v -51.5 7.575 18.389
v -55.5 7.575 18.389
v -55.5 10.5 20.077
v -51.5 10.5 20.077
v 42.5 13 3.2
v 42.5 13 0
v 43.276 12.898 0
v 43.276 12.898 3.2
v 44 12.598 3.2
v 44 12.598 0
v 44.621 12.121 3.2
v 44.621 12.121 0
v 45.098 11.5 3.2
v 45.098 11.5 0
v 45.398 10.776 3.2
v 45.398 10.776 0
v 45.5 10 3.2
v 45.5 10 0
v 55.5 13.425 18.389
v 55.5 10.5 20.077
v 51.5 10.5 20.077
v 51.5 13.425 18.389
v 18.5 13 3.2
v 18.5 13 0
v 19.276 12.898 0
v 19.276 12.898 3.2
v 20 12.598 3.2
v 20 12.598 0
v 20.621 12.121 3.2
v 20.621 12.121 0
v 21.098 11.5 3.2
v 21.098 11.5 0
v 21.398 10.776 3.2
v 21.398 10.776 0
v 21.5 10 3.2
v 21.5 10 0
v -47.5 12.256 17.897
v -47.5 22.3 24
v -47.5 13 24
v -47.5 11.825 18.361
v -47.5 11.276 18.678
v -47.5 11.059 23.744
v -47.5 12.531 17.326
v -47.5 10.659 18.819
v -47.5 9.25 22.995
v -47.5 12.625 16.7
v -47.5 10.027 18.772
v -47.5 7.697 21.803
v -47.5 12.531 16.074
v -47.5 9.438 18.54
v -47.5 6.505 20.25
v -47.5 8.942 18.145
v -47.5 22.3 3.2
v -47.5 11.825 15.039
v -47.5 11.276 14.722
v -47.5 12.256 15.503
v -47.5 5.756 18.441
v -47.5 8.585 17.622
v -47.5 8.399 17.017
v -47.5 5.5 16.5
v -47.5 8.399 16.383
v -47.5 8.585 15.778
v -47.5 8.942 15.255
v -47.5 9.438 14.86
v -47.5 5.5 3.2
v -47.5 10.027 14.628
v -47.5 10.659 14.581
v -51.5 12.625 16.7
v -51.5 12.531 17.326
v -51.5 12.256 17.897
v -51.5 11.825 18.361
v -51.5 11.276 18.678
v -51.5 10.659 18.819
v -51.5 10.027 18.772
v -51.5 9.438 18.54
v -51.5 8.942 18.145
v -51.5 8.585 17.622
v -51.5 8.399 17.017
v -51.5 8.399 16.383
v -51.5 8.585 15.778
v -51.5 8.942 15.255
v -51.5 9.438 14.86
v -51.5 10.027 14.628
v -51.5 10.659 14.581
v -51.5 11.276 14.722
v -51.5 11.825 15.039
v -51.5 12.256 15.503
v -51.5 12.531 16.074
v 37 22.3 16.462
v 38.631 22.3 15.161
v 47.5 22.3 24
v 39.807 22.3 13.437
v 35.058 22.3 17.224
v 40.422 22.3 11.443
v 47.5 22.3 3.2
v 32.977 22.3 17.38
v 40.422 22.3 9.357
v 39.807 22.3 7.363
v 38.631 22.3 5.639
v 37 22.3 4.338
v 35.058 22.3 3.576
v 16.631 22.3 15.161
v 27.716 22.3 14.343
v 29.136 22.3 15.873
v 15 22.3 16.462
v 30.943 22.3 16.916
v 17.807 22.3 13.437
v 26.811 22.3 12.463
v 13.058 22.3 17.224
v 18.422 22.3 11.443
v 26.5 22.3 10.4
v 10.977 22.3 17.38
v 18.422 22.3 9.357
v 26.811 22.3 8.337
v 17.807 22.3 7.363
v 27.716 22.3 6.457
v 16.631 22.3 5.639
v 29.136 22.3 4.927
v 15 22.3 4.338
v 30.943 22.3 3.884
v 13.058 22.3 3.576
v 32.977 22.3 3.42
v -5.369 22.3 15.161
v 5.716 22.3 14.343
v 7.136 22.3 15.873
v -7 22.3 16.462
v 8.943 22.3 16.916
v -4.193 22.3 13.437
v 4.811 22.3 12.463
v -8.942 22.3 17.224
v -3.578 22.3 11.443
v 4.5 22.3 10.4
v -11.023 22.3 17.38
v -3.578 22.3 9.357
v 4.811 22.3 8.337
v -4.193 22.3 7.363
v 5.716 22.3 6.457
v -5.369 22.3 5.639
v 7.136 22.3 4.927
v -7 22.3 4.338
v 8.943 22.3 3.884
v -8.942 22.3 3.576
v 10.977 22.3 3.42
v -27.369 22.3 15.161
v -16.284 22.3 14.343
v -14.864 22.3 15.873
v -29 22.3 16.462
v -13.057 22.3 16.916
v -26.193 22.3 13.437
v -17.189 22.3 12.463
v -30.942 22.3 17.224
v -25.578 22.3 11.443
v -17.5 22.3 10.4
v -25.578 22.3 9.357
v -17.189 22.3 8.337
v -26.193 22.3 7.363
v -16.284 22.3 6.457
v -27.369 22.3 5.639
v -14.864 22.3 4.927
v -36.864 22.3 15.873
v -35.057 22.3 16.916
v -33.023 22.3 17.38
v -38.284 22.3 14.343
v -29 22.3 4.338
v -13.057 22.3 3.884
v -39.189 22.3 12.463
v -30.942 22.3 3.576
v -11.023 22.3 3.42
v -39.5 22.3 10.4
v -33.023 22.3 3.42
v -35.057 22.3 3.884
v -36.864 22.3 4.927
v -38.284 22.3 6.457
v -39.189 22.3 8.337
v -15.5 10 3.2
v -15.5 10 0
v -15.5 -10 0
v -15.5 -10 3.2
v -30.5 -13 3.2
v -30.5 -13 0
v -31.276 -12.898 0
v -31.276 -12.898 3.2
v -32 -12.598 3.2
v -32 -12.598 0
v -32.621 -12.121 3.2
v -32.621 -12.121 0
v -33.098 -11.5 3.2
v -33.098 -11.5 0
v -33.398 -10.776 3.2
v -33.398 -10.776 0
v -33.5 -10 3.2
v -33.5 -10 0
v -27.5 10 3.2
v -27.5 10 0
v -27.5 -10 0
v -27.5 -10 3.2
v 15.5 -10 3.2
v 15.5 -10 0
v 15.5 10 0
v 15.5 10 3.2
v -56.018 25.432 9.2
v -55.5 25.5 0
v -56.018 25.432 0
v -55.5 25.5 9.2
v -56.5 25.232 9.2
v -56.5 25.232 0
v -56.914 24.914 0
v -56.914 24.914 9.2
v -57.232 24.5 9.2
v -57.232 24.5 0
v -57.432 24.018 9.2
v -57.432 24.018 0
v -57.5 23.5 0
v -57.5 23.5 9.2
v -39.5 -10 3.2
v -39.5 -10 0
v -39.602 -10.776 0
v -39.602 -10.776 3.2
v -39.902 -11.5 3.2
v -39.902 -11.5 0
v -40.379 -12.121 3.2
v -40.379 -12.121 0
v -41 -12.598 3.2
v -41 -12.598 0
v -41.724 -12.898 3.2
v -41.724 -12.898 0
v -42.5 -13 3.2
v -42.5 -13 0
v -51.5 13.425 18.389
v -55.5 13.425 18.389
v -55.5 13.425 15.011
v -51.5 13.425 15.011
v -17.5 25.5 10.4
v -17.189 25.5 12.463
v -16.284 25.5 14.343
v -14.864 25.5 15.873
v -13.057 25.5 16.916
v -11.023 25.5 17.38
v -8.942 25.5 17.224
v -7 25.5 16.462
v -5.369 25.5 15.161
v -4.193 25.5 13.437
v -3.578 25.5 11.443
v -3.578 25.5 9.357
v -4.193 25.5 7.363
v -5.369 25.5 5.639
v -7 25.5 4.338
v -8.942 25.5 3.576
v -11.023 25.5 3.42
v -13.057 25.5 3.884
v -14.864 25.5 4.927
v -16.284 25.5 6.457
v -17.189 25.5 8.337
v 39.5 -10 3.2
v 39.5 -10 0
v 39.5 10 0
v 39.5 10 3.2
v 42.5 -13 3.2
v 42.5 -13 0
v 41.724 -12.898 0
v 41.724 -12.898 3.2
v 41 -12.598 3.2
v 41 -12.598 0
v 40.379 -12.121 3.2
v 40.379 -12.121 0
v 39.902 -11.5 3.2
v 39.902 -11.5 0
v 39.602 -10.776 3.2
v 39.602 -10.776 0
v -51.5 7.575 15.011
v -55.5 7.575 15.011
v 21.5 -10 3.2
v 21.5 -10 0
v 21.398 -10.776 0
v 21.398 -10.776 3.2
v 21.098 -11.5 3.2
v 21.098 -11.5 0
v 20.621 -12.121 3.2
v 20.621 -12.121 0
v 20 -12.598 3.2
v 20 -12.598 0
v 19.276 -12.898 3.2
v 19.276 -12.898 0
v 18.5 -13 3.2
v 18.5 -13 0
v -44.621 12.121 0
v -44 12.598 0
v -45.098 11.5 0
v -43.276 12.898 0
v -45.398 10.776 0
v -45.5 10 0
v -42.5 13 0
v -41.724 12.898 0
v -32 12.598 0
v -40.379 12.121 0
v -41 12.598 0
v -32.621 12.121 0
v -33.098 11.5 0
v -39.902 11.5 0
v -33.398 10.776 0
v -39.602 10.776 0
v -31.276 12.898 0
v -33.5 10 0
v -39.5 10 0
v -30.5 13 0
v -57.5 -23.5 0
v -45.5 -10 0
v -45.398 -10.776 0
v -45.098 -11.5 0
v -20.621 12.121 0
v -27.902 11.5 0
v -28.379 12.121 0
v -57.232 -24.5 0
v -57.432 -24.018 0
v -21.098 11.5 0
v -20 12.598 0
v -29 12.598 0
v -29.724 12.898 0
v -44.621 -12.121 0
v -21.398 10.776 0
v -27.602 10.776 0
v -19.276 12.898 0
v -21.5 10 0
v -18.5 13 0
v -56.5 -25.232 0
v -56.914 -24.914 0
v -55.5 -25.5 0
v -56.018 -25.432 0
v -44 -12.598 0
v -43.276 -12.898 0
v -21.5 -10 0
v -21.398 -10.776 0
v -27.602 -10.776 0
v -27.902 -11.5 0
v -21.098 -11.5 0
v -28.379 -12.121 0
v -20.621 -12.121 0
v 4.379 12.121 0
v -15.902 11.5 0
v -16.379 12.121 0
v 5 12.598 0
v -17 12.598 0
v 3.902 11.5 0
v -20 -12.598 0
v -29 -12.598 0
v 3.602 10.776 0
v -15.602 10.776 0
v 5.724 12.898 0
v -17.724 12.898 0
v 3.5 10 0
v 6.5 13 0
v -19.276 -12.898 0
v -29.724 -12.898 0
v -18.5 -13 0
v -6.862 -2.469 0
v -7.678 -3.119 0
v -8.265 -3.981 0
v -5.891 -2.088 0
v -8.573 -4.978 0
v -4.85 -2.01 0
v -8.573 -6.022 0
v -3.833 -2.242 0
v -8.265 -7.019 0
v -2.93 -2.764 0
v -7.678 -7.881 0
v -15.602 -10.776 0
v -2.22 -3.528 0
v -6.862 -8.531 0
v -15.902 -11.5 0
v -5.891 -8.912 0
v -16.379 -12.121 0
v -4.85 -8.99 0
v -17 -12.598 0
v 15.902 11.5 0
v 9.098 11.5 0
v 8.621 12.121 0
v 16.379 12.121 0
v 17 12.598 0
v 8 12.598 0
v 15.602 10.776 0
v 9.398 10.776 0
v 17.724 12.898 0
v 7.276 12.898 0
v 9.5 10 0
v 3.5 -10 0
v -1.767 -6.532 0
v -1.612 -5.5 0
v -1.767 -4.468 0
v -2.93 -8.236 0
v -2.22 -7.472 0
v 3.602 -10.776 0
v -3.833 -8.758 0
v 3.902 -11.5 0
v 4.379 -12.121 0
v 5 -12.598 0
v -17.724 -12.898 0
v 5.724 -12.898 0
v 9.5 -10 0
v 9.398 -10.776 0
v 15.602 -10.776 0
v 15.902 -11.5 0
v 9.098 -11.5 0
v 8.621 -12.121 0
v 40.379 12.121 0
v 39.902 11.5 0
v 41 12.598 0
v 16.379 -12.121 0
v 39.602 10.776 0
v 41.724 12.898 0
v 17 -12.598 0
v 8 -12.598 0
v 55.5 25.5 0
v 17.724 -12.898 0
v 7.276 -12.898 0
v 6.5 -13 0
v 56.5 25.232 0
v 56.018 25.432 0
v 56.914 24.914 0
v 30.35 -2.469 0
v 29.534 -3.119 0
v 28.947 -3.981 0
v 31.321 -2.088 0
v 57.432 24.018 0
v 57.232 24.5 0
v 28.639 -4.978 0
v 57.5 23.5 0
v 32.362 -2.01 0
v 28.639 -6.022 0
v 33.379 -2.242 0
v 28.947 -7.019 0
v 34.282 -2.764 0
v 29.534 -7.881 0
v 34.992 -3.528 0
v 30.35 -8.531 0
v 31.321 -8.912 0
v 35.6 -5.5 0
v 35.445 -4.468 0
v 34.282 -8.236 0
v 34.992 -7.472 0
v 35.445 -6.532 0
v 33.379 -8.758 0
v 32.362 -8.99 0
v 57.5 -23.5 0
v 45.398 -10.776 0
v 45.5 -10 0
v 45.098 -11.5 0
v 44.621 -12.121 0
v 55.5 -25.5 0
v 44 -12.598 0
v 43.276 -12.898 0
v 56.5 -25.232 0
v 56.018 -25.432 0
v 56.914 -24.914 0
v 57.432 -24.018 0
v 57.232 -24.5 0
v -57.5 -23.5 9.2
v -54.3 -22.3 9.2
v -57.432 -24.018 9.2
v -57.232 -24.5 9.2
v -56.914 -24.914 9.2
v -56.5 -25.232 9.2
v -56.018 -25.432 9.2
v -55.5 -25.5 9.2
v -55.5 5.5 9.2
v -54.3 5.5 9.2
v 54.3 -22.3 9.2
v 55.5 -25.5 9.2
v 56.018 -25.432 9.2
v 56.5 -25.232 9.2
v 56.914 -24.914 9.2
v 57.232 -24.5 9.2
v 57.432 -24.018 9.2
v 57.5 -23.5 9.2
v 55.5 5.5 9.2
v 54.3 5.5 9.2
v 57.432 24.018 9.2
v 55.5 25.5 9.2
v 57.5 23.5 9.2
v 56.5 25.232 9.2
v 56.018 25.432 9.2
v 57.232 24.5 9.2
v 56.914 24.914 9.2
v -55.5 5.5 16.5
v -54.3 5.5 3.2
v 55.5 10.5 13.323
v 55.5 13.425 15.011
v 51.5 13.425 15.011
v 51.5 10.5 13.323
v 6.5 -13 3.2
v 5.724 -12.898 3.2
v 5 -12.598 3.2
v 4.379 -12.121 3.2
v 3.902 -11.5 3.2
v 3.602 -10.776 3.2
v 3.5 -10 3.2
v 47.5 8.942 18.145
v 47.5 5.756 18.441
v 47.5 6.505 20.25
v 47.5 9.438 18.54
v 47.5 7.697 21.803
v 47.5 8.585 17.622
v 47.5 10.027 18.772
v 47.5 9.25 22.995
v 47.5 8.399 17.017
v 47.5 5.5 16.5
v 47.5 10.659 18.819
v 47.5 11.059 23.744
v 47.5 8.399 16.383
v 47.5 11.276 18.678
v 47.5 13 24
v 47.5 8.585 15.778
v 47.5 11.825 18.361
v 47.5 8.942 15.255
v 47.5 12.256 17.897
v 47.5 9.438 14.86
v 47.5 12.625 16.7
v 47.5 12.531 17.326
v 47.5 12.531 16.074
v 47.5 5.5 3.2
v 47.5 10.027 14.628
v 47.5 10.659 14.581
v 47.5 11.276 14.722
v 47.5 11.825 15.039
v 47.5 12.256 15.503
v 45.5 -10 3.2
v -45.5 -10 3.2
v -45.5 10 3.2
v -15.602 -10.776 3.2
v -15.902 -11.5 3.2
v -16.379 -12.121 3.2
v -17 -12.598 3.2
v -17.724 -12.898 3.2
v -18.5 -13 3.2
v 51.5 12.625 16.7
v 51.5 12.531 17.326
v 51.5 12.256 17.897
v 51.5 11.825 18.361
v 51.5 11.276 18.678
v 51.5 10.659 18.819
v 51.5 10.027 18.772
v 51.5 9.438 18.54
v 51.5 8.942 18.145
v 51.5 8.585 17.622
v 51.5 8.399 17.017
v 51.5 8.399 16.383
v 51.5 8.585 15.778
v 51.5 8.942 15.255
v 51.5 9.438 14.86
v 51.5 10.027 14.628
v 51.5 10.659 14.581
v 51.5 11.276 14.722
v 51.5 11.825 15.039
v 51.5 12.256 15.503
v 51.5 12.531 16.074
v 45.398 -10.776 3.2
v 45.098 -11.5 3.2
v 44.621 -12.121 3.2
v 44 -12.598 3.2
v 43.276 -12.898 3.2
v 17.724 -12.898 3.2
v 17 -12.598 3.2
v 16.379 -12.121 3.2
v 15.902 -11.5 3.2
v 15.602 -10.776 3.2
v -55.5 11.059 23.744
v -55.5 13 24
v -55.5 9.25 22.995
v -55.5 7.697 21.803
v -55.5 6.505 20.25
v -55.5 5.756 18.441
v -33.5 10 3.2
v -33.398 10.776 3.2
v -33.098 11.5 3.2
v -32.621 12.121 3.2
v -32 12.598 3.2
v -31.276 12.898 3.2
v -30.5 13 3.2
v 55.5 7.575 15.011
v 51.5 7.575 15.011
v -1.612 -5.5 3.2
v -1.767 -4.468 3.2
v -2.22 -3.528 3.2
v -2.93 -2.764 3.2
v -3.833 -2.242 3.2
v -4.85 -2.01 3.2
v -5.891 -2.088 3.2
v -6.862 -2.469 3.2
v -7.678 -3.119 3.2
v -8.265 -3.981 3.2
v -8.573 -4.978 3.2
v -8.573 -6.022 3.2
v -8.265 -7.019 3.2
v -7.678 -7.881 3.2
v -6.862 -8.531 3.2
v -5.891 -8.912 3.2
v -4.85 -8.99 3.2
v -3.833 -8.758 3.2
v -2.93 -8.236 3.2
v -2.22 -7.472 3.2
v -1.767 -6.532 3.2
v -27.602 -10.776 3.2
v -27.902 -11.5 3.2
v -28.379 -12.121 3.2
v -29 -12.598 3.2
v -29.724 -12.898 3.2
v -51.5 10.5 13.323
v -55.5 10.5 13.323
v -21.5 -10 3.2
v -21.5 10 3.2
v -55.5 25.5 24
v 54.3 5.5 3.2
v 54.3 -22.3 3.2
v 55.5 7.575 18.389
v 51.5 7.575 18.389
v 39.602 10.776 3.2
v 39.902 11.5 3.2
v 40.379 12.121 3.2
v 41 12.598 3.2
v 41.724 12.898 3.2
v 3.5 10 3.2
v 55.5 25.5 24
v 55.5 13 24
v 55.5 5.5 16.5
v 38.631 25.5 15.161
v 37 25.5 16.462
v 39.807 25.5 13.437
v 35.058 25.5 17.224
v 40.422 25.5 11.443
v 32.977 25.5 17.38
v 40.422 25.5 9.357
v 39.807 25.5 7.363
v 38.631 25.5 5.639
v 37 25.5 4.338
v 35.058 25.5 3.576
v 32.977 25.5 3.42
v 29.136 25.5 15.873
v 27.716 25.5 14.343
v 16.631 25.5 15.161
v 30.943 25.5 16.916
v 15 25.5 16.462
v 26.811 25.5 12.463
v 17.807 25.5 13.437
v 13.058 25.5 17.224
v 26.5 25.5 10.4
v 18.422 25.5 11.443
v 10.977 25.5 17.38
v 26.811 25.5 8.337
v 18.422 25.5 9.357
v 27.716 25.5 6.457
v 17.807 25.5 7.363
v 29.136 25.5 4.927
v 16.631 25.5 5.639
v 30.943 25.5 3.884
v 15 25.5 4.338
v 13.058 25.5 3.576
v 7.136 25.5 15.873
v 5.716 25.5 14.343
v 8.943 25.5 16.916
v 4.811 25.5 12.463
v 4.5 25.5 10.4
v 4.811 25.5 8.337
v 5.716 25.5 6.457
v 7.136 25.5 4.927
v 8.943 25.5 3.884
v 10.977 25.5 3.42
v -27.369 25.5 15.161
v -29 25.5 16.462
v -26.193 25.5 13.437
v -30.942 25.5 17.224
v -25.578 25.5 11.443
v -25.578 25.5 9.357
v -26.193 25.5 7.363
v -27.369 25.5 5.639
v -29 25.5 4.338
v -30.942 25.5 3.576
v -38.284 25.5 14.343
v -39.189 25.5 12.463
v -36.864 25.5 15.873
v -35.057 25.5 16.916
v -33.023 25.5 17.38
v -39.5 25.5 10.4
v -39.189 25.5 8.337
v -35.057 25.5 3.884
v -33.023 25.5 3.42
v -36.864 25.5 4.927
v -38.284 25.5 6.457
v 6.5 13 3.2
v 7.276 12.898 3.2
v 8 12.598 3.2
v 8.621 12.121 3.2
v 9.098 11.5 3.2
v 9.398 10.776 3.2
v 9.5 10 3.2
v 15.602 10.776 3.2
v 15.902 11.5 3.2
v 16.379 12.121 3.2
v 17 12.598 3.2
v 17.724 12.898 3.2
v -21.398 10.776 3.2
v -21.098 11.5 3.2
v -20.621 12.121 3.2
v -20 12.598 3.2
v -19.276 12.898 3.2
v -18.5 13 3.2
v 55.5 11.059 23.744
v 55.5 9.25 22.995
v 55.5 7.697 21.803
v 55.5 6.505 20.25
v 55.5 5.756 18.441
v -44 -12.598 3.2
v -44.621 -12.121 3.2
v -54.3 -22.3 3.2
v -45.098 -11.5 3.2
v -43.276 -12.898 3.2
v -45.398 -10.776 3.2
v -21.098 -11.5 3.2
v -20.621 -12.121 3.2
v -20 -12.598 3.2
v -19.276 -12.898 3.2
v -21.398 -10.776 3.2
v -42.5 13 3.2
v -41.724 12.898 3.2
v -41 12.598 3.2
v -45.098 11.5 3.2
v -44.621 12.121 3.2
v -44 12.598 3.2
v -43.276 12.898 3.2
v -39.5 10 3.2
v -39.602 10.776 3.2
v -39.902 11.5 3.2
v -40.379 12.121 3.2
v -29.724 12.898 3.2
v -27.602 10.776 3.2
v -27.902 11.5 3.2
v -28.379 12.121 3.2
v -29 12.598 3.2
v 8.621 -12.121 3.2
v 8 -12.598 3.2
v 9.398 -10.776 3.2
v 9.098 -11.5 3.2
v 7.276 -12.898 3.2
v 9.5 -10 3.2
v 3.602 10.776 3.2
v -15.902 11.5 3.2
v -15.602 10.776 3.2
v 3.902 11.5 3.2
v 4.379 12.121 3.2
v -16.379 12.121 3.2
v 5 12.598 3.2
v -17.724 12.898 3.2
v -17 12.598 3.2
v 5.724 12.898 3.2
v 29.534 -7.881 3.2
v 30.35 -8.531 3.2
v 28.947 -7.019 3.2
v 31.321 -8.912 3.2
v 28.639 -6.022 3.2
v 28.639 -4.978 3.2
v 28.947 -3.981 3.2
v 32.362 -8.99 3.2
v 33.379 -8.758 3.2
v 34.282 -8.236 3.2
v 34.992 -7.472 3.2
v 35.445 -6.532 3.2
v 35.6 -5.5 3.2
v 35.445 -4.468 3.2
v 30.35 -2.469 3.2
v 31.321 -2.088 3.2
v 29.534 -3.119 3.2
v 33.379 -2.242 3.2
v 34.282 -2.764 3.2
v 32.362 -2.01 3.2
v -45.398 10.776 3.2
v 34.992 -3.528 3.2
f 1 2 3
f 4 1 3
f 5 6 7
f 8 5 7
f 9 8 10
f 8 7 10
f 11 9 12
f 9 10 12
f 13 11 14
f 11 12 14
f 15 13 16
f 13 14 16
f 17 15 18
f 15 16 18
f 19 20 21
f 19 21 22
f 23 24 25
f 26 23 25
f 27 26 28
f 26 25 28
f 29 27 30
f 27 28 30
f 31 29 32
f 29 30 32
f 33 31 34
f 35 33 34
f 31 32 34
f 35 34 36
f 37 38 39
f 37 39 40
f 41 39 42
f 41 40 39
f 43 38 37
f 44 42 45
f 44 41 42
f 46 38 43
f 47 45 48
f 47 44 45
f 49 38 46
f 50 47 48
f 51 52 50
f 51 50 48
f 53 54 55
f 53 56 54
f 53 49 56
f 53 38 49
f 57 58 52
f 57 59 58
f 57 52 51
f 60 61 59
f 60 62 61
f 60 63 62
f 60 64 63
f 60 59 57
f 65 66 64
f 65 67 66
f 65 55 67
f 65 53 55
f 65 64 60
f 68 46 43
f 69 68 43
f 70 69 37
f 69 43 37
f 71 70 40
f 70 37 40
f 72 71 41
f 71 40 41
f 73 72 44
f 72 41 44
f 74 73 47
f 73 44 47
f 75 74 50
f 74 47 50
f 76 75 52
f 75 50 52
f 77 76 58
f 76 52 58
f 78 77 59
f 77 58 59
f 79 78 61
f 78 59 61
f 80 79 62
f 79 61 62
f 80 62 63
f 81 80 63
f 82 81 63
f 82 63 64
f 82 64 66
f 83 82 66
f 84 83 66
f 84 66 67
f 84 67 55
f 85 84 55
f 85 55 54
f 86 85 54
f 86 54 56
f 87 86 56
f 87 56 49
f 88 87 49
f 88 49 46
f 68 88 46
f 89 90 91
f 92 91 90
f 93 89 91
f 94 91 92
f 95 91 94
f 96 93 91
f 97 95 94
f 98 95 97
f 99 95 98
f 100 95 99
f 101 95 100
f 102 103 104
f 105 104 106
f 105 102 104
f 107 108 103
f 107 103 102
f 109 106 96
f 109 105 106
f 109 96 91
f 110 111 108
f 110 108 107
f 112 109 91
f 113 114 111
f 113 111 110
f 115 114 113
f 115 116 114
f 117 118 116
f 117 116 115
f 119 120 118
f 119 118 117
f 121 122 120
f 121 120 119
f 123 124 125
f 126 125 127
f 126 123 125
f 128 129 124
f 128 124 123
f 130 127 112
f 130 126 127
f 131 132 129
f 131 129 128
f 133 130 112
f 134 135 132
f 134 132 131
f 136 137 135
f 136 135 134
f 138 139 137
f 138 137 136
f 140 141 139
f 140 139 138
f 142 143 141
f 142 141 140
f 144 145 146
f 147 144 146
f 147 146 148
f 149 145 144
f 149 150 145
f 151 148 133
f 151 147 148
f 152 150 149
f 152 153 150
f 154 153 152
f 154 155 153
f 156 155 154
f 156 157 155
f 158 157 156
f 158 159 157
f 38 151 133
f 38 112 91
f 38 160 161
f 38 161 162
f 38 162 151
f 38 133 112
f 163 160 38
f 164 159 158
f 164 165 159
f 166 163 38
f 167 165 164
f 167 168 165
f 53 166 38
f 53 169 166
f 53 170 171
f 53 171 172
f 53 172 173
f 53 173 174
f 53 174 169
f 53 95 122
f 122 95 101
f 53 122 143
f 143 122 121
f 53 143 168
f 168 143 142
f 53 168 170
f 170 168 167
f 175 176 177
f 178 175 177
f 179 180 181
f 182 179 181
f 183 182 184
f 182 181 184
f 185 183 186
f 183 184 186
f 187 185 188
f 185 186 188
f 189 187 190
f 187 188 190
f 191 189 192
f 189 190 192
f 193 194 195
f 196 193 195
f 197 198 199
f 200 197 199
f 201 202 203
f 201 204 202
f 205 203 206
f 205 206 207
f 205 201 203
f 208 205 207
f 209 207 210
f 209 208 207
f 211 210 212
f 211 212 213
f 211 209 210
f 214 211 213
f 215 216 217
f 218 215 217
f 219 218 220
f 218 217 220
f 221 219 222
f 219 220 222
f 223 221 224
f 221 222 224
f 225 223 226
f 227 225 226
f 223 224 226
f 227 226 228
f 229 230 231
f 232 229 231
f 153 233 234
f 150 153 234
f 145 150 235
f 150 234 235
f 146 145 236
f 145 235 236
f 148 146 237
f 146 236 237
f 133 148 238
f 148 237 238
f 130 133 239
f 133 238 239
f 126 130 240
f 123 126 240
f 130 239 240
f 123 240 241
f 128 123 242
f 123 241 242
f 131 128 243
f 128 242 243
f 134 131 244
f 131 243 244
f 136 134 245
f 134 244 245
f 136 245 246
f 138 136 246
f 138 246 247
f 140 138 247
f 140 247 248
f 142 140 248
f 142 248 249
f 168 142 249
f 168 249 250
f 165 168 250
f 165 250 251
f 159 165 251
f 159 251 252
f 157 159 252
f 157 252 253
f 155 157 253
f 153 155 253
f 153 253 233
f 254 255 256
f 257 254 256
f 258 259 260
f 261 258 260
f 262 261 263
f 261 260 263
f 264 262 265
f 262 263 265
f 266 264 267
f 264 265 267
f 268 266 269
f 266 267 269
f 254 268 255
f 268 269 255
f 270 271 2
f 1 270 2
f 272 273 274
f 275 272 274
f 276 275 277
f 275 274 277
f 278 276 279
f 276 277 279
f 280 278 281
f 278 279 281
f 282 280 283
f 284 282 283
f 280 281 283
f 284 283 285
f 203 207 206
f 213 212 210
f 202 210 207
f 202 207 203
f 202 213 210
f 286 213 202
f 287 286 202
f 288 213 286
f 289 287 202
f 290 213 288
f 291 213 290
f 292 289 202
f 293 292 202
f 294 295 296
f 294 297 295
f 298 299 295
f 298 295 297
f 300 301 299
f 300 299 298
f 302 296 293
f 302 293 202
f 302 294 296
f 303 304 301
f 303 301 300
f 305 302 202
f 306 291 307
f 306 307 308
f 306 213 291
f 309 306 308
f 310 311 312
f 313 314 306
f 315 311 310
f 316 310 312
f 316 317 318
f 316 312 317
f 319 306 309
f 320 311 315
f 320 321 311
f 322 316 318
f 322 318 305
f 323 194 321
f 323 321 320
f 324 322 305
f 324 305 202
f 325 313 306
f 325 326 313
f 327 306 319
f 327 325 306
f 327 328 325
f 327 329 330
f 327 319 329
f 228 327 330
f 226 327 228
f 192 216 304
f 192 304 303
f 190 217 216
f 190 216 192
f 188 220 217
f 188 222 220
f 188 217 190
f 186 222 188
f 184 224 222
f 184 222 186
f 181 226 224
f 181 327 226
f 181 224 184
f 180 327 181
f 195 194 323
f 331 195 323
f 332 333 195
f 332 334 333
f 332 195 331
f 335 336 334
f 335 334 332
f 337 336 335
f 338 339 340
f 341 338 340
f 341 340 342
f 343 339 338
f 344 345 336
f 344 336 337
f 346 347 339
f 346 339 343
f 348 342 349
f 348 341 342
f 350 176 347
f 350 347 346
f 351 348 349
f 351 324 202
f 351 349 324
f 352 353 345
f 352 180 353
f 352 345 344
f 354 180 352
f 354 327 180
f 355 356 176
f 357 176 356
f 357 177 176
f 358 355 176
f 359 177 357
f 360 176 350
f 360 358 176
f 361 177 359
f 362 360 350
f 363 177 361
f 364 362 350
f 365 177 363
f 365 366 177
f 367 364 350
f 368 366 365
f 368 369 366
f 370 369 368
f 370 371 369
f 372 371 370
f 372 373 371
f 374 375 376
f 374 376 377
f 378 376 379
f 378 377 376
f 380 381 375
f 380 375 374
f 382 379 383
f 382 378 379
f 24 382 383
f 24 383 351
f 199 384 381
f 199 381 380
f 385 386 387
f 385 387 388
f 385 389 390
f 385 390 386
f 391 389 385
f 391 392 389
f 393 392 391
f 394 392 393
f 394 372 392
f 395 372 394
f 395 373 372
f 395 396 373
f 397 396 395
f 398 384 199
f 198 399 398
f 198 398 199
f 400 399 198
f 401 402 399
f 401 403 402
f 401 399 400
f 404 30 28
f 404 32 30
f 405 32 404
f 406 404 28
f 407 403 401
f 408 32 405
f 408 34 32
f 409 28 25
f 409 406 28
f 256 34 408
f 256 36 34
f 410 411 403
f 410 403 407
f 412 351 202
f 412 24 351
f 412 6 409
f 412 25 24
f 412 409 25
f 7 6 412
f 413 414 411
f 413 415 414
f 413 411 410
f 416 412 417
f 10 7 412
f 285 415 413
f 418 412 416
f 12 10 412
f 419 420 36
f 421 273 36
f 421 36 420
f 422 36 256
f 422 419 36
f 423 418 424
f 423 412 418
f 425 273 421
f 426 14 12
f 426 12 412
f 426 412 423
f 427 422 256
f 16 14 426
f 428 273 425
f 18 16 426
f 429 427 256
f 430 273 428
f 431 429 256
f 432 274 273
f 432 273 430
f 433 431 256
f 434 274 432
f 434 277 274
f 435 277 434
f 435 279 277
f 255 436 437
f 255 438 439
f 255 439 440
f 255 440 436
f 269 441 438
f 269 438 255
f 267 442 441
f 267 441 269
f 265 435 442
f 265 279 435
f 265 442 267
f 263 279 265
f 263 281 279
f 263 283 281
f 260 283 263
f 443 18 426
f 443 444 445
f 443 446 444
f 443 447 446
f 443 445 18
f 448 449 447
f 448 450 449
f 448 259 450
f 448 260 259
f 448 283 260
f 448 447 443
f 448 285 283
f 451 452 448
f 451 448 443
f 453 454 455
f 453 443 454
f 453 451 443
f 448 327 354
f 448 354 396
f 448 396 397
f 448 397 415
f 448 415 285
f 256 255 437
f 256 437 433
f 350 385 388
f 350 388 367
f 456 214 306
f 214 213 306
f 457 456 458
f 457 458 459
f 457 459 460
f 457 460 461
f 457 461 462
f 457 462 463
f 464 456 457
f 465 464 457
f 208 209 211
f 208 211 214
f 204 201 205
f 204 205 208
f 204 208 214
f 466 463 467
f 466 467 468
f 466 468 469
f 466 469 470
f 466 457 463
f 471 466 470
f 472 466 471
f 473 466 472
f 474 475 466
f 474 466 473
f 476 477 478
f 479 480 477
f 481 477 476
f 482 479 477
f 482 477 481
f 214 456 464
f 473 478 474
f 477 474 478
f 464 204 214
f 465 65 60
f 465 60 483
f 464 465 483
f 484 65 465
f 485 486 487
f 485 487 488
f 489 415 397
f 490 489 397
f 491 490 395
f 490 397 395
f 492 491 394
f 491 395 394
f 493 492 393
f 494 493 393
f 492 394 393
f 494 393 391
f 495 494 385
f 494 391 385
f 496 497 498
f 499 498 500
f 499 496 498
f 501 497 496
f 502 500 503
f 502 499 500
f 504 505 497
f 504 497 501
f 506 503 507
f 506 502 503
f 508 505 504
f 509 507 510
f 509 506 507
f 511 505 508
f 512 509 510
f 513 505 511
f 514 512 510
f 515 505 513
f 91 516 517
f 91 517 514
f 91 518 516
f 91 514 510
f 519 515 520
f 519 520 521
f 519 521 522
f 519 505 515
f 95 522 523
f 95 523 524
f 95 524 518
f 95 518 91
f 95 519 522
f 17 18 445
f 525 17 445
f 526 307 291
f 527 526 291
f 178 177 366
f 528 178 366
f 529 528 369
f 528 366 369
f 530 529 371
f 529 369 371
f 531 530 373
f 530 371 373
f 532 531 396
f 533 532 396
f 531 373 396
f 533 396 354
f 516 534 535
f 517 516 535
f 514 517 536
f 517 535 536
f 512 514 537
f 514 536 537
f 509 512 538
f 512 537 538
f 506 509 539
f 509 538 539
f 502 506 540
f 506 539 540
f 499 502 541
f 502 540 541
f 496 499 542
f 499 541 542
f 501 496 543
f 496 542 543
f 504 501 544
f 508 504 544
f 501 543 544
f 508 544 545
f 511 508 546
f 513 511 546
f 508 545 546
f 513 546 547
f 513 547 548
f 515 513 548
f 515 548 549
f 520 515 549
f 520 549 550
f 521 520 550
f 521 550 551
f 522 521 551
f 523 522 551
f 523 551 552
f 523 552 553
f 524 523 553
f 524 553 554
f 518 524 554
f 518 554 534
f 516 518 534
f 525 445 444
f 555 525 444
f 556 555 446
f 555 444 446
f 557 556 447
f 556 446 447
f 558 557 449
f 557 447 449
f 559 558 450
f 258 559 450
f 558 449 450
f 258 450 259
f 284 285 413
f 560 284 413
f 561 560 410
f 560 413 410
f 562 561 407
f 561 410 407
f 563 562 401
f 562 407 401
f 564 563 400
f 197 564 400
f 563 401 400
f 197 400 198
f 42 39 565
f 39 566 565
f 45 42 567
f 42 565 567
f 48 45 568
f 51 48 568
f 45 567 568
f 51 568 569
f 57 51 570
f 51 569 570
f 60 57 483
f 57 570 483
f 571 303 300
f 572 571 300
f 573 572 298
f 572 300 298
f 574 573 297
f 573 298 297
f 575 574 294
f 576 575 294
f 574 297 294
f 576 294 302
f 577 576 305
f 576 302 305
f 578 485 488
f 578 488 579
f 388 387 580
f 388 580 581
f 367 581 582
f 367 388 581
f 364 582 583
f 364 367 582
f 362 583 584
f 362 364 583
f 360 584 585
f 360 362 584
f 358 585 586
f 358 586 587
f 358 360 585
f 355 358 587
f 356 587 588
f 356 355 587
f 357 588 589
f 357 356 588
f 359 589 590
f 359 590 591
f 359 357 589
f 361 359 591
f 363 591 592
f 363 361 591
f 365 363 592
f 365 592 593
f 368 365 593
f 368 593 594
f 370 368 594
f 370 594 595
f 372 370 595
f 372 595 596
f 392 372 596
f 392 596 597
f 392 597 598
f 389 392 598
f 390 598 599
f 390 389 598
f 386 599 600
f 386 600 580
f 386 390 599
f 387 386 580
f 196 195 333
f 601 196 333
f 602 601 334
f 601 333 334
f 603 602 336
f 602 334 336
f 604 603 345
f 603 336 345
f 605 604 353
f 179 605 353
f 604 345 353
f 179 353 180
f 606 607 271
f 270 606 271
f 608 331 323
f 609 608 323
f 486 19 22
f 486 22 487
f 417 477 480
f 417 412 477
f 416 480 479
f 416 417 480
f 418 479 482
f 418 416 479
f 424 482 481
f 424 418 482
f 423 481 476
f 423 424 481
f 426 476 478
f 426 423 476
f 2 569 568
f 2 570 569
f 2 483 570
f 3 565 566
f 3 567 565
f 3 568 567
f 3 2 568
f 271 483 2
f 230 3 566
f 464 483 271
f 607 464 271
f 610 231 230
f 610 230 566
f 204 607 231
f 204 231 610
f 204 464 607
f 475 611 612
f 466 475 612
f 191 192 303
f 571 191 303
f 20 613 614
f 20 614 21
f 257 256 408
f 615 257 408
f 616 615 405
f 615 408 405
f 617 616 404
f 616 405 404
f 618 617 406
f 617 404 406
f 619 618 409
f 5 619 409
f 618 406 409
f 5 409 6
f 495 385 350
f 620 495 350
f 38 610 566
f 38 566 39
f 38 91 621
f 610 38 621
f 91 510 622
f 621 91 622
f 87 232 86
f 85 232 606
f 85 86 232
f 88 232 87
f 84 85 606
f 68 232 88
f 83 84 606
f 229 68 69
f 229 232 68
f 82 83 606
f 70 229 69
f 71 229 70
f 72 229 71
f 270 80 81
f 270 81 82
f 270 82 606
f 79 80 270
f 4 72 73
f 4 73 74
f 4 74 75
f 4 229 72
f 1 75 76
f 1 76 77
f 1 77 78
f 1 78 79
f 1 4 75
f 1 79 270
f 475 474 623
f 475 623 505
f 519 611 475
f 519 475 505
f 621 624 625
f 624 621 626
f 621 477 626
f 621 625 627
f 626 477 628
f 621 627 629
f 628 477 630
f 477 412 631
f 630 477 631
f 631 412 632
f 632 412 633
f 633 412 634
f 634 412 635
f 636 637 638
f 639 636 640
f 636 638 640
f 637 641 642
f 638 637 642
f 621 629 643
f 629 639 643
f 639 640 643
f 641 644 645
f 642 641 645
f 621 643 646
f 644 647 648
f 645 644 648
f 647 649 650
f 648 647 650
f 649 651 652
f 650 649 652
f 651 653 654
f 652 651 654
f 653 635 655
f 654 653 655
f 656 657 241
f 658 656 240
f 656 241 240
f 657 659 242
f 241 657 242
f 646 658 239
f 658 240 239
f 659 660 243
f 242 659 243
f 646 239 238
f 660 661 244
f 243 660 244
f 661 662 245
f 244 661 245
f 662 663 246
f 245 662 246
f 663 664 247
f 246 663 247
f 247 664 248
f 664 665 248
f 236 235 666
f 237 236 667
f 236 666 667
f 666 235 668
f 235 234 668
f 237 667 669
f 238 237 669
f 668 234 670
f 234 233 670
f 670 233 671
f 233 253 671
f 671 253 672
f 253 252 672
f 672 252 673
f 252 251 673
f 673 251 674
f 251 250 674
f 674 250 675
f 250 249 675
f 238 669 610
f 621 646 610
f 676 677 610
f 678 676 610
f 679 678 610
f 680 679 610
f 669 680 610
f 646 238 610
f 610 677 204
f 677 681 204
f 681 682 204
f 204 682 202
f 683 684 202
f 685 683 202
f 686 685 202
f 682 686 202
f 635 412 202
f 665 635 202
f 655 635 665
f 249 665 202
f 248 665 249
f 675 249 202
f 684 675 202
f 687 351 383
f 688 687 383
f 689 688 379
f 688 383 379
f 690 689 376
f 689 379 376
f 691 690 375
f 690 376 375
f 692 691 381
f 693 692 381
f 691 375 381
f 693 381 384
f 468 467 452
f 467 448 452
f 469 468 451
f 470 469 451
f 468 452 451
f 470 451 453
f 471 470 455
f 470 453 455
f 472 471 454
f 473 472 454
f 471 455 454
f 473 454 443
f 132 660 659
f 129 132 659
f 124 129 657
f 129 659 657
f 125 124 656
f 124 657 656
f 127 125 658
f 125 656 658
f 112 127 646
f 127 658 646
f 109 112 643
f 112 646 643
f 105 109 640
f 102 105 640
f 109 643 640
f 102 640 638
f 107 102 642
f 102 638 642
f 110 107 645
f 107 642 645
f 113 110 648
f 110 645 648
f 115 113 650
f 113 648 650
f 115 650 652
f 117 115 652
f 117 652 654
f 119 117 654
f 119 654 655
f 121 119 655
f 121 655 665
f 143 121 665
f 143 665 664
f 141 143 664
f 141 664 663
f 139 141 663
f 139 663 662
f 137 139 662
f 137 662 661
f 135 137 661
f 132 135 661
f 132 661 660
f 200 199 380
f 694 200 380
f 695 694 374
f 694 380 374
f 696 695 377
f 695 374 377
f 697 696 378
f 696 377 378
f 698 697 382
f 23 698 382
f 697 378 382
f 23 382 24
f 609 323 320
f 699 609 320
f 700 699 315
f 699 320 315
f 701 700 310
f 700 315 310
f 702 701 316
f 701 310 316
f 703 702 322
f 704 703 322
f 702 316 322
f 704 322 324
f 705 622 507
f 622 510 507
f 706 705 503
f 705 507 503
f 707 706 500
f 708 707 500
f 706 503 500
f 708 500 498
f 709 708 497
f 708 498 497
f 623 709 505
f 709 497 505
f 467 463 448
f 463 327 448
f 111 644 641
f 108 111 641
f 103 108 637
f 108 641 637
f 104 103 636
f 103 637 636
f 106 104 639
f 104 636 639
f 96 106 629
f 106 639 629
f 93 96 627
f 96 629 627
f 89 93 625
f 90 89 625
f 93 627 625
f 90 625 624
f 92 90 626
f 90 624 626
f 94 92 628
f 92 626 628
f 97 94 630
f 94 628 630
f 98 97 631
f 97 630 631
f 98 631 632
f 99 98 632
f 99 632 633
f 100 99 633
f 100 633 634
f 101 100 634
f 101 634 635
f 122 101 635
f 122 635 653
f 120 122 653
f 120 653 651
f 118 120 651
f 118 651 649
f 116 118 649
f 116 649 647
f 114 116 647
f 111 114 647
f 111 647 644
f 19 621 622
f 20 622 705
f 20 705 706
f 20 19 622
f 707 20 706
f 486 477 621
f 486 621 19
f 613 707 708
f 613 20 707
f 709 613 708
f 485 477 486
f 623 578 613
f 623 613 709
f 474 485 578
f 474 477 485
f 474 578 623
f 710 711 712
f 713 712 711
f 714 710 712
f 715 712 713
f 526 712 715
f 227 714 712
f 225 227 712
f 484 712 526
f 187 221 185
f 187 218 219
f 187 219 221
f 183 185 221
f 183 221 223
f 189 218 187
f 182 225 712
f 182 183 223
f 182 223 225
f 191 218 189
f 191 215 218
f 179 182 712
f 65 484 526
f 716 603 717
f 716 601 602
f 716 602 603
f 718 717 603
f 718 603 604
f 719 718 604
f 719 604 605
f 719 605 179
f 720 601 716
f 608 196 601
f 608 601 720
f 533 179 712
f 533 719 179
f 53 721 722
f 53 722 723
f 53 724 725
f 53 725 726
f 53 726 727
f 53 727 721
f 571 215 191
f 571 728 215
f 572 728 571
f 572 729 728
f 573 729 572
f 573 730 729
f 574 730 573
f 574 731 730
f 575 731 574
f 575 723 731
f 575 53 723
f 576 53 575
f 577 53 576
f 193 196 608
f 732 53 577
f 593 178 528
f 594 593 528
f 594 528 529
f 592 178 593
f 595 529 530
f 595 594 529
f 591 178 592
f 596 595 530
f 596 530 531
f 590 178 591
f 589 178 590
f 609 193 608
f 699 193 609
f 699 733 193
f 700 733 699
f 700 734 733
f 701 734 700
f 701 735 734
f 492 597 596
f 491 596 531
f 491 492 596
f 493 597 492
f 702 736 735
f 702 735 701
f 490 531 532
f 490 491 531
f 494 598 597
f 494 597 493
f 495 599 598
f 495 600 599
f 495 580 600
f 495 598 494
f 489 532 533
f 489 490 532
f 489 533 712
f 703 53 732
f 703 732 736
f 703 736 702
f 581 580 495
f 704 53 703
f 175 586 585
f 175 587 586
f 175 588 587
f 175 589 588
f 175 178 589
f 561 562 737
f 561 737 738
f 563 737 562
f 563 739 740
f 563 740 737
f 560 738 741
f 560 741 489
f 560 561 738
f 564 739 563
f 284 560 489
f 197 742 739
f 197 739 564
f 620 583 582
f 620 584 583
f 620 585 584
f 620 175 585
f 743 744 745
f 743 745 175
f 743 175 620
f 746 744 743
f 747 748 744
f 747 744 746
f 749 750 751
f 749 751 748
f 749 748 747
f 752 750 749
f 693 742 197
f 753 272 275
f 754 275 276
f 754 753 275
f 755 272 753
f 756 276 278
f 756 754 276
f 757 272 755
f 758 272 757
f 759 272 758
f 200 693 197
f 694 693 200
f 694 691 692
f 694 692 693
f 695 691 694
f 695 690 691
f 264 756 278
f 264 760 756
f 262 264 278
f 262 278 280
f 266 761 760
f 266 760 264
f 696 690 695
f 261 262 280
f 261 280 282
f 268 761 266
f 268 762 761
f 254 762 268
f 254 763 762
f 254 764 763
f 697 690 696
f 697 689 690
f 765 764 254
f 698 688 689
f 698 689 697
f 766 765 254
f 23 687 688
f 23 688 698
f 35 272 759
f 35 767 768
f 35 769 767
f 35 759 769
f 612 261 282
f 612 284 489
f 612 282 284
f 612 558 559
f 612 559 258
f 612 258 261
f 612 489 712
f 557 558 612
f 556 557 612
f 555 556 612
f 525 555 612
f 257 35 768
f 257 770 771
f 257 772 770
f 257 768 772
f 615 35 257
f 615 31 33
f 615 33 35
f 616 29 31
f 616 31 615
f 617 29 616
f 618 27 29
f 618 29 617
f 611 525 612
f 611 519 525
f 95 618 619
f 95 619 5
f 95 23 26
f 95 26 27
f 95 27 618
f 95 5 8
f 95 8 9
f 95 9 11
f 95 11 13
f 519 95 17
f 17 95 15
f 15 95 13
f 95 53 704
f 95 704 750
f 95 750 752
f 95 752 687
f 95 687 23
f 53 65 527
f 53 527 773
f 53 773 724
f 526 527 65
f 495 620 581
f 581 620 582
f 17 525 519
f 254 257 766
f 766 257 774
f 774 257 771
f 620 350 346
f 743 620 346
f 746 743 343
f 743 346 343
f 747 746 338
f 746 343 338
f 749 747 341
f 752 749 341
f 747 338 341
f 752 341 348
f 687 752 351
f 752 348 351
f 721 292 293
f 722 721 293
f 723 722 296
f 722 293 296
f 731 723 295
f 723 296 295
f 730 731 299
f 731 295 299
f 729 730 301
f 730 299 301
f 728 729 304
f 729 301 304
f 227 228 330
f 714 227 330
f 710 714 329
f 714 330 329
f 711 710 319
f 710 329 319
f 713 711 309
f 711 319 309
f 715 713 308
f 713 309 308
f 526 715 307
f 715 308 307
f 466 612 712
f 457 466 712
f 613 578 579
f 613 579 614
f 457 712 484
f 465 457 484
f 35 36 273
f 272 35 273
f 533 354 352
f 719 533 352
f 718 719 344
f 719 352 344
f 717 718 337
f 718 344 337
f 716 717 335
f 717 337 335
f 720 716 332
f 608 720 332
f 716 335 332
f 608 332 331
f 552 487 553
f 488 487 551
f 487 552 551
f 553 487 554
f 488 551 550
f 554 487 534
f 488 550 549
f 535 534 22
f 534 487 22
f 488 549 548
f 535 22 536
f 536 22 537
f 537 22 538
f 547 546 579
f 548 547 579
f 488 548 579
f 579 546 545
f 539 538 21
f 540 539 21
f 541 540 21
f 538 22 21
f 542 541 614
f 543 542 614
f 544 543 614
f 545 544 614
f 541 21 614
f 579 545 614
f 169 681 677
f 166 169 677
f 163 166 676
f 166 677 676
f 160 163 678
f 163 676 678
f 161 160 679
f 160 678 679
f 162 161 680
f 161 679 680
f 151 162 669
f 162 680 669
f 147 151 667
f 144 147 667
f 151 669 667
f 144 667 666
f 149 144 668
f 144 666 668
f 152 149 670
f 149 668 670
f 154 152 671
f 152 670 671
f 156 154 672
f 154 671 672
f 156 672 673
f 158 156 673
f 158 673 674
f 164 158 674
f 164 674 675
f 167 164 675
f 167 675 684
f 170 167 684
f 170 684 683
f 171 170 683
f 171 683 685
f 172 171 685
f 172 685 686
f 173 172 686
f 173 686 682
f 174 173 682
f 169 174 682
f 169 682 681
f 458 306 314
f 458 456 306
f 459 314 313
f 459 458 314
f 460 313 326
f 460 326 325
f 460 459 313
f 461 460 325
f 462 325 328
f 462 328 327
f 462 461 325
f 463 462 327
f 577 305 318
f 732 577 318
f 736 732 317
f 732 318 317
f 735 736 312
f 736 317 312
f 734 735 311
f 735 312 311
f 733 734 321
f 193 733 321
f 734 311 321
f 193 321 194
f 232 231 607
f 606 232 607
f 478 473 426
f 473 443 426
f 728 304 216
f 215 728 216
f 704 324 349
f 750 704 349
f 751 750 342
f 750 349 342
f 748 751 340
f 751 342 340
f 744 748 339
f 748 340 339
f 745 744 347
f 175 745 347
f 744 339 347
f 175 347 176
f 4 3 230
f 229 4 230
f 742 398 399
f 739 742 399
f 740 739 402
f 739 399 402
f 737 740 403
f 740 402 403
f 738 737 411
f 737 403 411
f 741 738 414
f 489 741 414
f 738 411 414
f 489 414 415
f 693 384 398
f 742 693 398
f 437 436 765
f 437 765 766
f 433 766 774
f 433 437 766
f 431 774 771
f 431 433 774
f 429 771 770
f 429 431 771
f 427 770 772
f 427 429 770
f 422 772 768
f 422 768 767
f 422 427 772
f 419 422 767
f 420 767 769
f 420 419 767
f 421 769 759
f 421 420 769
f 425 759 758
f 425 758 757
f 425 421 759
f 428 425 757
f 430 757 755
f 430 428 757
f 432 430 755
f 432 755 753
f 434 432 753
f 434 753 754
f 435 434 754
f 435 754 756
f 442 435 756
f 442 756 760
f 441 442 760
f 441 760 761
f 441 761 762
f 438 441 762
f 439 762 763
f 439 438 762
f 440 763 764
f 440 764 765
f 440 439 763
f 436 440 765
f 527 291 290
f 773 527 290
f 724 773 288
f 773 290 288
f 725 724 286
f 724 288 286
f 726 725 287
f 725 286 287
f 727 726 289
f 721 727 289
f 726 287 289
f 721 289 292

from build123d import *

# Parameters (mm, degrees)
F0_W      = 115
F0_H      = 51
F0_R      = 3.5
F1_DEPTH  = 3.2
F3_DEPTH  = 24
F5_DEPTH  = 6
F6_R      = 2.125
F7_DEPTH  = 113.001
F8_R      = 7.5
F9_R      = 2
F10_R     = 7
F11_DEPTH = 5
F13_DEPTH = 4


# Not quite as in the source:
# - a pattern or mirror of a feature is missing from the dataset's text; its kind, count and spacing are read off the source's solid


with BuildPart() as f1:
    # F0 (on Top) → F1 (new body)
    with BuildSketch(Plane.XY):
        Rectangle(F0_W, F0_H)
        with BuildLine():
            Line((-39.5, 10), (-39.5, -10))
            ThreePointArc((-39.5, -10), (-40.3786796564, -12.1213203436), (-42.5, -13))
            ThreePointArc((-42.5, -13), (-44.6213203436, -12.1213203436), (-45.5, -10))
            Line((-45.5, -10), (-45.5, 10))
            ThreePointArc((-45.5, 10), (-44.6213203436, 12.1213203436), (-42.5, 13))
            ThreePointArc((-42.5, 13), (-40.3786796564, 12.1213203436), (-39.5, 10))
        make_face(mode=Mode.SUBTRACT)
        with Locations((-5.112, -5.5)):
            Circle(F0_R, mode=Mode.SUBTRACT)
        with Locations((32.1, -5.5)):
            Circle(F0_R, mode=Mode.SUBTRACT)
        with BuildLine():
            Line((-27.5, 10), (-27.5, -10))
            ThreePointArc((-27.5, -10), (-28.3786796564, -12.1213203436), (-30.5, -13))
            ThreePointArc((-30.5, -13), (-32.6213203436, -12.1213203436), (-33.5, -10))
            Line((-33.5, -10), (-33.5, 10))
            ThreePointArc((-33.5, 10), (-32.6213203436, 12.1213203436), (-30.5, 13))
            ThreePointArc((-30.5, 13), (-28.3786796564, 12.1213203436), (-27.5, 10))
        make_face(mode=Mode.SUBTRACT)
        with BuildLine():
            Line((-15.5, 10), (-15.5, -10))
            ThreePointArc((-15.5, -10), (-16.3786796564, -12.1213203436), (-18.5, -13))
            ThreePointArc((-18.5, -13), (-20.6213203436, -12.1213203436), (-21.5, -10))
            Line((-21.5, -10), (-21.5, 10))
            ThreePointArc((-21.5, 10), (-20.6213203436, 12.1213203436), (-18.5, 13))
            ThreePointArc((-18.5, 13), (-16.3786796564, 12.1213203436), (-15.5, 10))
        make_face(mode=Mode.SUBTRACT)
        with BuildLine():
            Line((9.5, 10), (9.5, -10))
            ThreePointArc((9.5, -10), (8.6213203436, -12.1213203436), (6.5, -13))
            ThreePointArc((6.5, -13), (4.3786796564, -12.1213203436), (3.5, -10))
            Line((3.5, -10), (3.5, 10))
            ThreePointArc((3.5, 10), (4.3786796564, 12.1213203436), (6.5, 13))
            ThreePointArc((6.5, 13), (8.6213203436, 12.1213203436), (9.5, 10))
        make_face(mode=Mode.SUBTRACT)
        with BuildLine():
            Line((21.5, 10), (21.5, -10))
            ThreePointArc((21.5, -10), (20.6213203436, -12.1213203436), (18.5, -13))
            ThreePointArc((18.5, -13), (16.3786796564, -12.1213203436), (15.5, -10))
            Line((15.5, -10), (15.5, 10))
            ThreePointArc((15.5, 10), (16.3786796564, 12.1213203436), (18.5, 13))
            ThreePointArc((18.5, 13), (20.6213203436, 12.1213203436), (21.5, 10))
        make_face(mode=Mode.SUBTRACT)
        with BuildLine():
            Line((45.5, 10), (45.5, -10))
            ThreePointArc((45.5, -10), (44.6213203436, -12.1213203436), (42.5, -13))
            ThreePointArc((42.5, -13), (40.3786796564, -12.1213203436), (39.5, -10))
            Line((39.5, -10), (39.5, 10))
            ThreePointArc((39.5, 10), (40.3786796564, 12.1213203436), (42.5, 13))
            ThreePointArc((42.5, 13), (44.6213203436, 12.1213203436), (45.5, 10))
        make_face(mode=Mode.SUBTRACT)
    extrude(amount=F1_DEPTH)

    # F2 (on face) → F3 (join)
    with BuildSketch(Plane(origin=(0, 0, 0), x_dir=(1, 0, 0), z_dir=(0, 0, -1))):
        Polygon((-47.5, -5.5), (-55.5, -5.5), (-55.5, -25.5), (55.5, -25.5), (55.5, -5.5), (47.5, -5.5), (47.5, -22.3), (-47.5, -22.3), align=None)
    extrude(amount=-F3_DEPTH)

    # F4 (on face) → F5 (join)
    with BuildSketch(Plane.XY.offset(3.2)):
        Polygon((-55.5, 5.5), (-55.5, 25.5), (-57.5, 25.5), (-57.5, -25.5), (57.5, -25.5), (57.5, 25.5), (55.5, 25.5), (55.5, 5.5), (54.3, 5.5), (54.3, -22.3), (-54.3, -22.3), (-54.3, 5.5), align=None)
    extrude(amount=F5_DEPTH)

    # F6 (on face) → F7 (cut, through all)
    with BuildSketch(Plane.YZ.offset(55.5)):
        with Locations((10.5, 16.7)):
            Circle(F6_R)
    extrude(amount=-F7_DEPTH, mode=Mode.SUBTRACT)

    # F8
    f8_edges = [f1.edges().sort_by_distance(p)[0] for p in [
        (51.5, 5.5, 24),
        (-51.5, 5.5, 24),
    ]]
    fillet(f8_edges, radius=F8_R)

    # F9
    f9_edges = [f1.edges().sort_by_distance(p)[0] for p in [
        (-57.5, -25.5, 4.6),
        (57.5, -25.5, 4.6),
        (57.5, 25.5, 4.6),
        (-57.5, 25.5, 4.6),
    ]]
    fillet(f9_edges, radius=F9_R)

    # F10 (on face) → F11 (cut)
    with BuildSketch(Plane(origin=(0, 25.5, 0), x_dir=(-1, 0, 0), z_dir=(0, 1, 0))):
        with Locations((-33.5, 10.4)):
            Circle(F10_R)
        with Locations((-11.5, 10.4)):
            Circle(F10_R)
        with Locations((10.5, 10.4)):
            Circle(F10_R)
        with Locations((32.5, 10.4)):
            Circle(F10_R)
    extrude(amount=-F11_DEPTH, mode=Mode.SUBTRACT)

    # F12 (on face) → F13 (cut)
    with BuildSketch(Plane(origin=(-55.5, 0, 0), x_dir=(0, -1, 0), z_dir=(-1, 0, 0))):
        Polygon((-7.575, 15.0112504626), (-7.575, 18.3887495374), (-10.5, 20.0774990748), (-13.425, 18.3887495374), (-13.425, 15.0112504626), (-10.5, 13.3225009252), align=None)
    f13 = extrude(amount=-F13_DEPTH, mode=Mode.SUBTRACT)

    # F13_copies: F13 across plane
    add(f13.mirror(Plane(origin=(0, 0, 0), x_dir=(0, 0, 1), z_dir=(1, 0, 0))), mode=Mode.SUBTRACT)


solid = f1.part
